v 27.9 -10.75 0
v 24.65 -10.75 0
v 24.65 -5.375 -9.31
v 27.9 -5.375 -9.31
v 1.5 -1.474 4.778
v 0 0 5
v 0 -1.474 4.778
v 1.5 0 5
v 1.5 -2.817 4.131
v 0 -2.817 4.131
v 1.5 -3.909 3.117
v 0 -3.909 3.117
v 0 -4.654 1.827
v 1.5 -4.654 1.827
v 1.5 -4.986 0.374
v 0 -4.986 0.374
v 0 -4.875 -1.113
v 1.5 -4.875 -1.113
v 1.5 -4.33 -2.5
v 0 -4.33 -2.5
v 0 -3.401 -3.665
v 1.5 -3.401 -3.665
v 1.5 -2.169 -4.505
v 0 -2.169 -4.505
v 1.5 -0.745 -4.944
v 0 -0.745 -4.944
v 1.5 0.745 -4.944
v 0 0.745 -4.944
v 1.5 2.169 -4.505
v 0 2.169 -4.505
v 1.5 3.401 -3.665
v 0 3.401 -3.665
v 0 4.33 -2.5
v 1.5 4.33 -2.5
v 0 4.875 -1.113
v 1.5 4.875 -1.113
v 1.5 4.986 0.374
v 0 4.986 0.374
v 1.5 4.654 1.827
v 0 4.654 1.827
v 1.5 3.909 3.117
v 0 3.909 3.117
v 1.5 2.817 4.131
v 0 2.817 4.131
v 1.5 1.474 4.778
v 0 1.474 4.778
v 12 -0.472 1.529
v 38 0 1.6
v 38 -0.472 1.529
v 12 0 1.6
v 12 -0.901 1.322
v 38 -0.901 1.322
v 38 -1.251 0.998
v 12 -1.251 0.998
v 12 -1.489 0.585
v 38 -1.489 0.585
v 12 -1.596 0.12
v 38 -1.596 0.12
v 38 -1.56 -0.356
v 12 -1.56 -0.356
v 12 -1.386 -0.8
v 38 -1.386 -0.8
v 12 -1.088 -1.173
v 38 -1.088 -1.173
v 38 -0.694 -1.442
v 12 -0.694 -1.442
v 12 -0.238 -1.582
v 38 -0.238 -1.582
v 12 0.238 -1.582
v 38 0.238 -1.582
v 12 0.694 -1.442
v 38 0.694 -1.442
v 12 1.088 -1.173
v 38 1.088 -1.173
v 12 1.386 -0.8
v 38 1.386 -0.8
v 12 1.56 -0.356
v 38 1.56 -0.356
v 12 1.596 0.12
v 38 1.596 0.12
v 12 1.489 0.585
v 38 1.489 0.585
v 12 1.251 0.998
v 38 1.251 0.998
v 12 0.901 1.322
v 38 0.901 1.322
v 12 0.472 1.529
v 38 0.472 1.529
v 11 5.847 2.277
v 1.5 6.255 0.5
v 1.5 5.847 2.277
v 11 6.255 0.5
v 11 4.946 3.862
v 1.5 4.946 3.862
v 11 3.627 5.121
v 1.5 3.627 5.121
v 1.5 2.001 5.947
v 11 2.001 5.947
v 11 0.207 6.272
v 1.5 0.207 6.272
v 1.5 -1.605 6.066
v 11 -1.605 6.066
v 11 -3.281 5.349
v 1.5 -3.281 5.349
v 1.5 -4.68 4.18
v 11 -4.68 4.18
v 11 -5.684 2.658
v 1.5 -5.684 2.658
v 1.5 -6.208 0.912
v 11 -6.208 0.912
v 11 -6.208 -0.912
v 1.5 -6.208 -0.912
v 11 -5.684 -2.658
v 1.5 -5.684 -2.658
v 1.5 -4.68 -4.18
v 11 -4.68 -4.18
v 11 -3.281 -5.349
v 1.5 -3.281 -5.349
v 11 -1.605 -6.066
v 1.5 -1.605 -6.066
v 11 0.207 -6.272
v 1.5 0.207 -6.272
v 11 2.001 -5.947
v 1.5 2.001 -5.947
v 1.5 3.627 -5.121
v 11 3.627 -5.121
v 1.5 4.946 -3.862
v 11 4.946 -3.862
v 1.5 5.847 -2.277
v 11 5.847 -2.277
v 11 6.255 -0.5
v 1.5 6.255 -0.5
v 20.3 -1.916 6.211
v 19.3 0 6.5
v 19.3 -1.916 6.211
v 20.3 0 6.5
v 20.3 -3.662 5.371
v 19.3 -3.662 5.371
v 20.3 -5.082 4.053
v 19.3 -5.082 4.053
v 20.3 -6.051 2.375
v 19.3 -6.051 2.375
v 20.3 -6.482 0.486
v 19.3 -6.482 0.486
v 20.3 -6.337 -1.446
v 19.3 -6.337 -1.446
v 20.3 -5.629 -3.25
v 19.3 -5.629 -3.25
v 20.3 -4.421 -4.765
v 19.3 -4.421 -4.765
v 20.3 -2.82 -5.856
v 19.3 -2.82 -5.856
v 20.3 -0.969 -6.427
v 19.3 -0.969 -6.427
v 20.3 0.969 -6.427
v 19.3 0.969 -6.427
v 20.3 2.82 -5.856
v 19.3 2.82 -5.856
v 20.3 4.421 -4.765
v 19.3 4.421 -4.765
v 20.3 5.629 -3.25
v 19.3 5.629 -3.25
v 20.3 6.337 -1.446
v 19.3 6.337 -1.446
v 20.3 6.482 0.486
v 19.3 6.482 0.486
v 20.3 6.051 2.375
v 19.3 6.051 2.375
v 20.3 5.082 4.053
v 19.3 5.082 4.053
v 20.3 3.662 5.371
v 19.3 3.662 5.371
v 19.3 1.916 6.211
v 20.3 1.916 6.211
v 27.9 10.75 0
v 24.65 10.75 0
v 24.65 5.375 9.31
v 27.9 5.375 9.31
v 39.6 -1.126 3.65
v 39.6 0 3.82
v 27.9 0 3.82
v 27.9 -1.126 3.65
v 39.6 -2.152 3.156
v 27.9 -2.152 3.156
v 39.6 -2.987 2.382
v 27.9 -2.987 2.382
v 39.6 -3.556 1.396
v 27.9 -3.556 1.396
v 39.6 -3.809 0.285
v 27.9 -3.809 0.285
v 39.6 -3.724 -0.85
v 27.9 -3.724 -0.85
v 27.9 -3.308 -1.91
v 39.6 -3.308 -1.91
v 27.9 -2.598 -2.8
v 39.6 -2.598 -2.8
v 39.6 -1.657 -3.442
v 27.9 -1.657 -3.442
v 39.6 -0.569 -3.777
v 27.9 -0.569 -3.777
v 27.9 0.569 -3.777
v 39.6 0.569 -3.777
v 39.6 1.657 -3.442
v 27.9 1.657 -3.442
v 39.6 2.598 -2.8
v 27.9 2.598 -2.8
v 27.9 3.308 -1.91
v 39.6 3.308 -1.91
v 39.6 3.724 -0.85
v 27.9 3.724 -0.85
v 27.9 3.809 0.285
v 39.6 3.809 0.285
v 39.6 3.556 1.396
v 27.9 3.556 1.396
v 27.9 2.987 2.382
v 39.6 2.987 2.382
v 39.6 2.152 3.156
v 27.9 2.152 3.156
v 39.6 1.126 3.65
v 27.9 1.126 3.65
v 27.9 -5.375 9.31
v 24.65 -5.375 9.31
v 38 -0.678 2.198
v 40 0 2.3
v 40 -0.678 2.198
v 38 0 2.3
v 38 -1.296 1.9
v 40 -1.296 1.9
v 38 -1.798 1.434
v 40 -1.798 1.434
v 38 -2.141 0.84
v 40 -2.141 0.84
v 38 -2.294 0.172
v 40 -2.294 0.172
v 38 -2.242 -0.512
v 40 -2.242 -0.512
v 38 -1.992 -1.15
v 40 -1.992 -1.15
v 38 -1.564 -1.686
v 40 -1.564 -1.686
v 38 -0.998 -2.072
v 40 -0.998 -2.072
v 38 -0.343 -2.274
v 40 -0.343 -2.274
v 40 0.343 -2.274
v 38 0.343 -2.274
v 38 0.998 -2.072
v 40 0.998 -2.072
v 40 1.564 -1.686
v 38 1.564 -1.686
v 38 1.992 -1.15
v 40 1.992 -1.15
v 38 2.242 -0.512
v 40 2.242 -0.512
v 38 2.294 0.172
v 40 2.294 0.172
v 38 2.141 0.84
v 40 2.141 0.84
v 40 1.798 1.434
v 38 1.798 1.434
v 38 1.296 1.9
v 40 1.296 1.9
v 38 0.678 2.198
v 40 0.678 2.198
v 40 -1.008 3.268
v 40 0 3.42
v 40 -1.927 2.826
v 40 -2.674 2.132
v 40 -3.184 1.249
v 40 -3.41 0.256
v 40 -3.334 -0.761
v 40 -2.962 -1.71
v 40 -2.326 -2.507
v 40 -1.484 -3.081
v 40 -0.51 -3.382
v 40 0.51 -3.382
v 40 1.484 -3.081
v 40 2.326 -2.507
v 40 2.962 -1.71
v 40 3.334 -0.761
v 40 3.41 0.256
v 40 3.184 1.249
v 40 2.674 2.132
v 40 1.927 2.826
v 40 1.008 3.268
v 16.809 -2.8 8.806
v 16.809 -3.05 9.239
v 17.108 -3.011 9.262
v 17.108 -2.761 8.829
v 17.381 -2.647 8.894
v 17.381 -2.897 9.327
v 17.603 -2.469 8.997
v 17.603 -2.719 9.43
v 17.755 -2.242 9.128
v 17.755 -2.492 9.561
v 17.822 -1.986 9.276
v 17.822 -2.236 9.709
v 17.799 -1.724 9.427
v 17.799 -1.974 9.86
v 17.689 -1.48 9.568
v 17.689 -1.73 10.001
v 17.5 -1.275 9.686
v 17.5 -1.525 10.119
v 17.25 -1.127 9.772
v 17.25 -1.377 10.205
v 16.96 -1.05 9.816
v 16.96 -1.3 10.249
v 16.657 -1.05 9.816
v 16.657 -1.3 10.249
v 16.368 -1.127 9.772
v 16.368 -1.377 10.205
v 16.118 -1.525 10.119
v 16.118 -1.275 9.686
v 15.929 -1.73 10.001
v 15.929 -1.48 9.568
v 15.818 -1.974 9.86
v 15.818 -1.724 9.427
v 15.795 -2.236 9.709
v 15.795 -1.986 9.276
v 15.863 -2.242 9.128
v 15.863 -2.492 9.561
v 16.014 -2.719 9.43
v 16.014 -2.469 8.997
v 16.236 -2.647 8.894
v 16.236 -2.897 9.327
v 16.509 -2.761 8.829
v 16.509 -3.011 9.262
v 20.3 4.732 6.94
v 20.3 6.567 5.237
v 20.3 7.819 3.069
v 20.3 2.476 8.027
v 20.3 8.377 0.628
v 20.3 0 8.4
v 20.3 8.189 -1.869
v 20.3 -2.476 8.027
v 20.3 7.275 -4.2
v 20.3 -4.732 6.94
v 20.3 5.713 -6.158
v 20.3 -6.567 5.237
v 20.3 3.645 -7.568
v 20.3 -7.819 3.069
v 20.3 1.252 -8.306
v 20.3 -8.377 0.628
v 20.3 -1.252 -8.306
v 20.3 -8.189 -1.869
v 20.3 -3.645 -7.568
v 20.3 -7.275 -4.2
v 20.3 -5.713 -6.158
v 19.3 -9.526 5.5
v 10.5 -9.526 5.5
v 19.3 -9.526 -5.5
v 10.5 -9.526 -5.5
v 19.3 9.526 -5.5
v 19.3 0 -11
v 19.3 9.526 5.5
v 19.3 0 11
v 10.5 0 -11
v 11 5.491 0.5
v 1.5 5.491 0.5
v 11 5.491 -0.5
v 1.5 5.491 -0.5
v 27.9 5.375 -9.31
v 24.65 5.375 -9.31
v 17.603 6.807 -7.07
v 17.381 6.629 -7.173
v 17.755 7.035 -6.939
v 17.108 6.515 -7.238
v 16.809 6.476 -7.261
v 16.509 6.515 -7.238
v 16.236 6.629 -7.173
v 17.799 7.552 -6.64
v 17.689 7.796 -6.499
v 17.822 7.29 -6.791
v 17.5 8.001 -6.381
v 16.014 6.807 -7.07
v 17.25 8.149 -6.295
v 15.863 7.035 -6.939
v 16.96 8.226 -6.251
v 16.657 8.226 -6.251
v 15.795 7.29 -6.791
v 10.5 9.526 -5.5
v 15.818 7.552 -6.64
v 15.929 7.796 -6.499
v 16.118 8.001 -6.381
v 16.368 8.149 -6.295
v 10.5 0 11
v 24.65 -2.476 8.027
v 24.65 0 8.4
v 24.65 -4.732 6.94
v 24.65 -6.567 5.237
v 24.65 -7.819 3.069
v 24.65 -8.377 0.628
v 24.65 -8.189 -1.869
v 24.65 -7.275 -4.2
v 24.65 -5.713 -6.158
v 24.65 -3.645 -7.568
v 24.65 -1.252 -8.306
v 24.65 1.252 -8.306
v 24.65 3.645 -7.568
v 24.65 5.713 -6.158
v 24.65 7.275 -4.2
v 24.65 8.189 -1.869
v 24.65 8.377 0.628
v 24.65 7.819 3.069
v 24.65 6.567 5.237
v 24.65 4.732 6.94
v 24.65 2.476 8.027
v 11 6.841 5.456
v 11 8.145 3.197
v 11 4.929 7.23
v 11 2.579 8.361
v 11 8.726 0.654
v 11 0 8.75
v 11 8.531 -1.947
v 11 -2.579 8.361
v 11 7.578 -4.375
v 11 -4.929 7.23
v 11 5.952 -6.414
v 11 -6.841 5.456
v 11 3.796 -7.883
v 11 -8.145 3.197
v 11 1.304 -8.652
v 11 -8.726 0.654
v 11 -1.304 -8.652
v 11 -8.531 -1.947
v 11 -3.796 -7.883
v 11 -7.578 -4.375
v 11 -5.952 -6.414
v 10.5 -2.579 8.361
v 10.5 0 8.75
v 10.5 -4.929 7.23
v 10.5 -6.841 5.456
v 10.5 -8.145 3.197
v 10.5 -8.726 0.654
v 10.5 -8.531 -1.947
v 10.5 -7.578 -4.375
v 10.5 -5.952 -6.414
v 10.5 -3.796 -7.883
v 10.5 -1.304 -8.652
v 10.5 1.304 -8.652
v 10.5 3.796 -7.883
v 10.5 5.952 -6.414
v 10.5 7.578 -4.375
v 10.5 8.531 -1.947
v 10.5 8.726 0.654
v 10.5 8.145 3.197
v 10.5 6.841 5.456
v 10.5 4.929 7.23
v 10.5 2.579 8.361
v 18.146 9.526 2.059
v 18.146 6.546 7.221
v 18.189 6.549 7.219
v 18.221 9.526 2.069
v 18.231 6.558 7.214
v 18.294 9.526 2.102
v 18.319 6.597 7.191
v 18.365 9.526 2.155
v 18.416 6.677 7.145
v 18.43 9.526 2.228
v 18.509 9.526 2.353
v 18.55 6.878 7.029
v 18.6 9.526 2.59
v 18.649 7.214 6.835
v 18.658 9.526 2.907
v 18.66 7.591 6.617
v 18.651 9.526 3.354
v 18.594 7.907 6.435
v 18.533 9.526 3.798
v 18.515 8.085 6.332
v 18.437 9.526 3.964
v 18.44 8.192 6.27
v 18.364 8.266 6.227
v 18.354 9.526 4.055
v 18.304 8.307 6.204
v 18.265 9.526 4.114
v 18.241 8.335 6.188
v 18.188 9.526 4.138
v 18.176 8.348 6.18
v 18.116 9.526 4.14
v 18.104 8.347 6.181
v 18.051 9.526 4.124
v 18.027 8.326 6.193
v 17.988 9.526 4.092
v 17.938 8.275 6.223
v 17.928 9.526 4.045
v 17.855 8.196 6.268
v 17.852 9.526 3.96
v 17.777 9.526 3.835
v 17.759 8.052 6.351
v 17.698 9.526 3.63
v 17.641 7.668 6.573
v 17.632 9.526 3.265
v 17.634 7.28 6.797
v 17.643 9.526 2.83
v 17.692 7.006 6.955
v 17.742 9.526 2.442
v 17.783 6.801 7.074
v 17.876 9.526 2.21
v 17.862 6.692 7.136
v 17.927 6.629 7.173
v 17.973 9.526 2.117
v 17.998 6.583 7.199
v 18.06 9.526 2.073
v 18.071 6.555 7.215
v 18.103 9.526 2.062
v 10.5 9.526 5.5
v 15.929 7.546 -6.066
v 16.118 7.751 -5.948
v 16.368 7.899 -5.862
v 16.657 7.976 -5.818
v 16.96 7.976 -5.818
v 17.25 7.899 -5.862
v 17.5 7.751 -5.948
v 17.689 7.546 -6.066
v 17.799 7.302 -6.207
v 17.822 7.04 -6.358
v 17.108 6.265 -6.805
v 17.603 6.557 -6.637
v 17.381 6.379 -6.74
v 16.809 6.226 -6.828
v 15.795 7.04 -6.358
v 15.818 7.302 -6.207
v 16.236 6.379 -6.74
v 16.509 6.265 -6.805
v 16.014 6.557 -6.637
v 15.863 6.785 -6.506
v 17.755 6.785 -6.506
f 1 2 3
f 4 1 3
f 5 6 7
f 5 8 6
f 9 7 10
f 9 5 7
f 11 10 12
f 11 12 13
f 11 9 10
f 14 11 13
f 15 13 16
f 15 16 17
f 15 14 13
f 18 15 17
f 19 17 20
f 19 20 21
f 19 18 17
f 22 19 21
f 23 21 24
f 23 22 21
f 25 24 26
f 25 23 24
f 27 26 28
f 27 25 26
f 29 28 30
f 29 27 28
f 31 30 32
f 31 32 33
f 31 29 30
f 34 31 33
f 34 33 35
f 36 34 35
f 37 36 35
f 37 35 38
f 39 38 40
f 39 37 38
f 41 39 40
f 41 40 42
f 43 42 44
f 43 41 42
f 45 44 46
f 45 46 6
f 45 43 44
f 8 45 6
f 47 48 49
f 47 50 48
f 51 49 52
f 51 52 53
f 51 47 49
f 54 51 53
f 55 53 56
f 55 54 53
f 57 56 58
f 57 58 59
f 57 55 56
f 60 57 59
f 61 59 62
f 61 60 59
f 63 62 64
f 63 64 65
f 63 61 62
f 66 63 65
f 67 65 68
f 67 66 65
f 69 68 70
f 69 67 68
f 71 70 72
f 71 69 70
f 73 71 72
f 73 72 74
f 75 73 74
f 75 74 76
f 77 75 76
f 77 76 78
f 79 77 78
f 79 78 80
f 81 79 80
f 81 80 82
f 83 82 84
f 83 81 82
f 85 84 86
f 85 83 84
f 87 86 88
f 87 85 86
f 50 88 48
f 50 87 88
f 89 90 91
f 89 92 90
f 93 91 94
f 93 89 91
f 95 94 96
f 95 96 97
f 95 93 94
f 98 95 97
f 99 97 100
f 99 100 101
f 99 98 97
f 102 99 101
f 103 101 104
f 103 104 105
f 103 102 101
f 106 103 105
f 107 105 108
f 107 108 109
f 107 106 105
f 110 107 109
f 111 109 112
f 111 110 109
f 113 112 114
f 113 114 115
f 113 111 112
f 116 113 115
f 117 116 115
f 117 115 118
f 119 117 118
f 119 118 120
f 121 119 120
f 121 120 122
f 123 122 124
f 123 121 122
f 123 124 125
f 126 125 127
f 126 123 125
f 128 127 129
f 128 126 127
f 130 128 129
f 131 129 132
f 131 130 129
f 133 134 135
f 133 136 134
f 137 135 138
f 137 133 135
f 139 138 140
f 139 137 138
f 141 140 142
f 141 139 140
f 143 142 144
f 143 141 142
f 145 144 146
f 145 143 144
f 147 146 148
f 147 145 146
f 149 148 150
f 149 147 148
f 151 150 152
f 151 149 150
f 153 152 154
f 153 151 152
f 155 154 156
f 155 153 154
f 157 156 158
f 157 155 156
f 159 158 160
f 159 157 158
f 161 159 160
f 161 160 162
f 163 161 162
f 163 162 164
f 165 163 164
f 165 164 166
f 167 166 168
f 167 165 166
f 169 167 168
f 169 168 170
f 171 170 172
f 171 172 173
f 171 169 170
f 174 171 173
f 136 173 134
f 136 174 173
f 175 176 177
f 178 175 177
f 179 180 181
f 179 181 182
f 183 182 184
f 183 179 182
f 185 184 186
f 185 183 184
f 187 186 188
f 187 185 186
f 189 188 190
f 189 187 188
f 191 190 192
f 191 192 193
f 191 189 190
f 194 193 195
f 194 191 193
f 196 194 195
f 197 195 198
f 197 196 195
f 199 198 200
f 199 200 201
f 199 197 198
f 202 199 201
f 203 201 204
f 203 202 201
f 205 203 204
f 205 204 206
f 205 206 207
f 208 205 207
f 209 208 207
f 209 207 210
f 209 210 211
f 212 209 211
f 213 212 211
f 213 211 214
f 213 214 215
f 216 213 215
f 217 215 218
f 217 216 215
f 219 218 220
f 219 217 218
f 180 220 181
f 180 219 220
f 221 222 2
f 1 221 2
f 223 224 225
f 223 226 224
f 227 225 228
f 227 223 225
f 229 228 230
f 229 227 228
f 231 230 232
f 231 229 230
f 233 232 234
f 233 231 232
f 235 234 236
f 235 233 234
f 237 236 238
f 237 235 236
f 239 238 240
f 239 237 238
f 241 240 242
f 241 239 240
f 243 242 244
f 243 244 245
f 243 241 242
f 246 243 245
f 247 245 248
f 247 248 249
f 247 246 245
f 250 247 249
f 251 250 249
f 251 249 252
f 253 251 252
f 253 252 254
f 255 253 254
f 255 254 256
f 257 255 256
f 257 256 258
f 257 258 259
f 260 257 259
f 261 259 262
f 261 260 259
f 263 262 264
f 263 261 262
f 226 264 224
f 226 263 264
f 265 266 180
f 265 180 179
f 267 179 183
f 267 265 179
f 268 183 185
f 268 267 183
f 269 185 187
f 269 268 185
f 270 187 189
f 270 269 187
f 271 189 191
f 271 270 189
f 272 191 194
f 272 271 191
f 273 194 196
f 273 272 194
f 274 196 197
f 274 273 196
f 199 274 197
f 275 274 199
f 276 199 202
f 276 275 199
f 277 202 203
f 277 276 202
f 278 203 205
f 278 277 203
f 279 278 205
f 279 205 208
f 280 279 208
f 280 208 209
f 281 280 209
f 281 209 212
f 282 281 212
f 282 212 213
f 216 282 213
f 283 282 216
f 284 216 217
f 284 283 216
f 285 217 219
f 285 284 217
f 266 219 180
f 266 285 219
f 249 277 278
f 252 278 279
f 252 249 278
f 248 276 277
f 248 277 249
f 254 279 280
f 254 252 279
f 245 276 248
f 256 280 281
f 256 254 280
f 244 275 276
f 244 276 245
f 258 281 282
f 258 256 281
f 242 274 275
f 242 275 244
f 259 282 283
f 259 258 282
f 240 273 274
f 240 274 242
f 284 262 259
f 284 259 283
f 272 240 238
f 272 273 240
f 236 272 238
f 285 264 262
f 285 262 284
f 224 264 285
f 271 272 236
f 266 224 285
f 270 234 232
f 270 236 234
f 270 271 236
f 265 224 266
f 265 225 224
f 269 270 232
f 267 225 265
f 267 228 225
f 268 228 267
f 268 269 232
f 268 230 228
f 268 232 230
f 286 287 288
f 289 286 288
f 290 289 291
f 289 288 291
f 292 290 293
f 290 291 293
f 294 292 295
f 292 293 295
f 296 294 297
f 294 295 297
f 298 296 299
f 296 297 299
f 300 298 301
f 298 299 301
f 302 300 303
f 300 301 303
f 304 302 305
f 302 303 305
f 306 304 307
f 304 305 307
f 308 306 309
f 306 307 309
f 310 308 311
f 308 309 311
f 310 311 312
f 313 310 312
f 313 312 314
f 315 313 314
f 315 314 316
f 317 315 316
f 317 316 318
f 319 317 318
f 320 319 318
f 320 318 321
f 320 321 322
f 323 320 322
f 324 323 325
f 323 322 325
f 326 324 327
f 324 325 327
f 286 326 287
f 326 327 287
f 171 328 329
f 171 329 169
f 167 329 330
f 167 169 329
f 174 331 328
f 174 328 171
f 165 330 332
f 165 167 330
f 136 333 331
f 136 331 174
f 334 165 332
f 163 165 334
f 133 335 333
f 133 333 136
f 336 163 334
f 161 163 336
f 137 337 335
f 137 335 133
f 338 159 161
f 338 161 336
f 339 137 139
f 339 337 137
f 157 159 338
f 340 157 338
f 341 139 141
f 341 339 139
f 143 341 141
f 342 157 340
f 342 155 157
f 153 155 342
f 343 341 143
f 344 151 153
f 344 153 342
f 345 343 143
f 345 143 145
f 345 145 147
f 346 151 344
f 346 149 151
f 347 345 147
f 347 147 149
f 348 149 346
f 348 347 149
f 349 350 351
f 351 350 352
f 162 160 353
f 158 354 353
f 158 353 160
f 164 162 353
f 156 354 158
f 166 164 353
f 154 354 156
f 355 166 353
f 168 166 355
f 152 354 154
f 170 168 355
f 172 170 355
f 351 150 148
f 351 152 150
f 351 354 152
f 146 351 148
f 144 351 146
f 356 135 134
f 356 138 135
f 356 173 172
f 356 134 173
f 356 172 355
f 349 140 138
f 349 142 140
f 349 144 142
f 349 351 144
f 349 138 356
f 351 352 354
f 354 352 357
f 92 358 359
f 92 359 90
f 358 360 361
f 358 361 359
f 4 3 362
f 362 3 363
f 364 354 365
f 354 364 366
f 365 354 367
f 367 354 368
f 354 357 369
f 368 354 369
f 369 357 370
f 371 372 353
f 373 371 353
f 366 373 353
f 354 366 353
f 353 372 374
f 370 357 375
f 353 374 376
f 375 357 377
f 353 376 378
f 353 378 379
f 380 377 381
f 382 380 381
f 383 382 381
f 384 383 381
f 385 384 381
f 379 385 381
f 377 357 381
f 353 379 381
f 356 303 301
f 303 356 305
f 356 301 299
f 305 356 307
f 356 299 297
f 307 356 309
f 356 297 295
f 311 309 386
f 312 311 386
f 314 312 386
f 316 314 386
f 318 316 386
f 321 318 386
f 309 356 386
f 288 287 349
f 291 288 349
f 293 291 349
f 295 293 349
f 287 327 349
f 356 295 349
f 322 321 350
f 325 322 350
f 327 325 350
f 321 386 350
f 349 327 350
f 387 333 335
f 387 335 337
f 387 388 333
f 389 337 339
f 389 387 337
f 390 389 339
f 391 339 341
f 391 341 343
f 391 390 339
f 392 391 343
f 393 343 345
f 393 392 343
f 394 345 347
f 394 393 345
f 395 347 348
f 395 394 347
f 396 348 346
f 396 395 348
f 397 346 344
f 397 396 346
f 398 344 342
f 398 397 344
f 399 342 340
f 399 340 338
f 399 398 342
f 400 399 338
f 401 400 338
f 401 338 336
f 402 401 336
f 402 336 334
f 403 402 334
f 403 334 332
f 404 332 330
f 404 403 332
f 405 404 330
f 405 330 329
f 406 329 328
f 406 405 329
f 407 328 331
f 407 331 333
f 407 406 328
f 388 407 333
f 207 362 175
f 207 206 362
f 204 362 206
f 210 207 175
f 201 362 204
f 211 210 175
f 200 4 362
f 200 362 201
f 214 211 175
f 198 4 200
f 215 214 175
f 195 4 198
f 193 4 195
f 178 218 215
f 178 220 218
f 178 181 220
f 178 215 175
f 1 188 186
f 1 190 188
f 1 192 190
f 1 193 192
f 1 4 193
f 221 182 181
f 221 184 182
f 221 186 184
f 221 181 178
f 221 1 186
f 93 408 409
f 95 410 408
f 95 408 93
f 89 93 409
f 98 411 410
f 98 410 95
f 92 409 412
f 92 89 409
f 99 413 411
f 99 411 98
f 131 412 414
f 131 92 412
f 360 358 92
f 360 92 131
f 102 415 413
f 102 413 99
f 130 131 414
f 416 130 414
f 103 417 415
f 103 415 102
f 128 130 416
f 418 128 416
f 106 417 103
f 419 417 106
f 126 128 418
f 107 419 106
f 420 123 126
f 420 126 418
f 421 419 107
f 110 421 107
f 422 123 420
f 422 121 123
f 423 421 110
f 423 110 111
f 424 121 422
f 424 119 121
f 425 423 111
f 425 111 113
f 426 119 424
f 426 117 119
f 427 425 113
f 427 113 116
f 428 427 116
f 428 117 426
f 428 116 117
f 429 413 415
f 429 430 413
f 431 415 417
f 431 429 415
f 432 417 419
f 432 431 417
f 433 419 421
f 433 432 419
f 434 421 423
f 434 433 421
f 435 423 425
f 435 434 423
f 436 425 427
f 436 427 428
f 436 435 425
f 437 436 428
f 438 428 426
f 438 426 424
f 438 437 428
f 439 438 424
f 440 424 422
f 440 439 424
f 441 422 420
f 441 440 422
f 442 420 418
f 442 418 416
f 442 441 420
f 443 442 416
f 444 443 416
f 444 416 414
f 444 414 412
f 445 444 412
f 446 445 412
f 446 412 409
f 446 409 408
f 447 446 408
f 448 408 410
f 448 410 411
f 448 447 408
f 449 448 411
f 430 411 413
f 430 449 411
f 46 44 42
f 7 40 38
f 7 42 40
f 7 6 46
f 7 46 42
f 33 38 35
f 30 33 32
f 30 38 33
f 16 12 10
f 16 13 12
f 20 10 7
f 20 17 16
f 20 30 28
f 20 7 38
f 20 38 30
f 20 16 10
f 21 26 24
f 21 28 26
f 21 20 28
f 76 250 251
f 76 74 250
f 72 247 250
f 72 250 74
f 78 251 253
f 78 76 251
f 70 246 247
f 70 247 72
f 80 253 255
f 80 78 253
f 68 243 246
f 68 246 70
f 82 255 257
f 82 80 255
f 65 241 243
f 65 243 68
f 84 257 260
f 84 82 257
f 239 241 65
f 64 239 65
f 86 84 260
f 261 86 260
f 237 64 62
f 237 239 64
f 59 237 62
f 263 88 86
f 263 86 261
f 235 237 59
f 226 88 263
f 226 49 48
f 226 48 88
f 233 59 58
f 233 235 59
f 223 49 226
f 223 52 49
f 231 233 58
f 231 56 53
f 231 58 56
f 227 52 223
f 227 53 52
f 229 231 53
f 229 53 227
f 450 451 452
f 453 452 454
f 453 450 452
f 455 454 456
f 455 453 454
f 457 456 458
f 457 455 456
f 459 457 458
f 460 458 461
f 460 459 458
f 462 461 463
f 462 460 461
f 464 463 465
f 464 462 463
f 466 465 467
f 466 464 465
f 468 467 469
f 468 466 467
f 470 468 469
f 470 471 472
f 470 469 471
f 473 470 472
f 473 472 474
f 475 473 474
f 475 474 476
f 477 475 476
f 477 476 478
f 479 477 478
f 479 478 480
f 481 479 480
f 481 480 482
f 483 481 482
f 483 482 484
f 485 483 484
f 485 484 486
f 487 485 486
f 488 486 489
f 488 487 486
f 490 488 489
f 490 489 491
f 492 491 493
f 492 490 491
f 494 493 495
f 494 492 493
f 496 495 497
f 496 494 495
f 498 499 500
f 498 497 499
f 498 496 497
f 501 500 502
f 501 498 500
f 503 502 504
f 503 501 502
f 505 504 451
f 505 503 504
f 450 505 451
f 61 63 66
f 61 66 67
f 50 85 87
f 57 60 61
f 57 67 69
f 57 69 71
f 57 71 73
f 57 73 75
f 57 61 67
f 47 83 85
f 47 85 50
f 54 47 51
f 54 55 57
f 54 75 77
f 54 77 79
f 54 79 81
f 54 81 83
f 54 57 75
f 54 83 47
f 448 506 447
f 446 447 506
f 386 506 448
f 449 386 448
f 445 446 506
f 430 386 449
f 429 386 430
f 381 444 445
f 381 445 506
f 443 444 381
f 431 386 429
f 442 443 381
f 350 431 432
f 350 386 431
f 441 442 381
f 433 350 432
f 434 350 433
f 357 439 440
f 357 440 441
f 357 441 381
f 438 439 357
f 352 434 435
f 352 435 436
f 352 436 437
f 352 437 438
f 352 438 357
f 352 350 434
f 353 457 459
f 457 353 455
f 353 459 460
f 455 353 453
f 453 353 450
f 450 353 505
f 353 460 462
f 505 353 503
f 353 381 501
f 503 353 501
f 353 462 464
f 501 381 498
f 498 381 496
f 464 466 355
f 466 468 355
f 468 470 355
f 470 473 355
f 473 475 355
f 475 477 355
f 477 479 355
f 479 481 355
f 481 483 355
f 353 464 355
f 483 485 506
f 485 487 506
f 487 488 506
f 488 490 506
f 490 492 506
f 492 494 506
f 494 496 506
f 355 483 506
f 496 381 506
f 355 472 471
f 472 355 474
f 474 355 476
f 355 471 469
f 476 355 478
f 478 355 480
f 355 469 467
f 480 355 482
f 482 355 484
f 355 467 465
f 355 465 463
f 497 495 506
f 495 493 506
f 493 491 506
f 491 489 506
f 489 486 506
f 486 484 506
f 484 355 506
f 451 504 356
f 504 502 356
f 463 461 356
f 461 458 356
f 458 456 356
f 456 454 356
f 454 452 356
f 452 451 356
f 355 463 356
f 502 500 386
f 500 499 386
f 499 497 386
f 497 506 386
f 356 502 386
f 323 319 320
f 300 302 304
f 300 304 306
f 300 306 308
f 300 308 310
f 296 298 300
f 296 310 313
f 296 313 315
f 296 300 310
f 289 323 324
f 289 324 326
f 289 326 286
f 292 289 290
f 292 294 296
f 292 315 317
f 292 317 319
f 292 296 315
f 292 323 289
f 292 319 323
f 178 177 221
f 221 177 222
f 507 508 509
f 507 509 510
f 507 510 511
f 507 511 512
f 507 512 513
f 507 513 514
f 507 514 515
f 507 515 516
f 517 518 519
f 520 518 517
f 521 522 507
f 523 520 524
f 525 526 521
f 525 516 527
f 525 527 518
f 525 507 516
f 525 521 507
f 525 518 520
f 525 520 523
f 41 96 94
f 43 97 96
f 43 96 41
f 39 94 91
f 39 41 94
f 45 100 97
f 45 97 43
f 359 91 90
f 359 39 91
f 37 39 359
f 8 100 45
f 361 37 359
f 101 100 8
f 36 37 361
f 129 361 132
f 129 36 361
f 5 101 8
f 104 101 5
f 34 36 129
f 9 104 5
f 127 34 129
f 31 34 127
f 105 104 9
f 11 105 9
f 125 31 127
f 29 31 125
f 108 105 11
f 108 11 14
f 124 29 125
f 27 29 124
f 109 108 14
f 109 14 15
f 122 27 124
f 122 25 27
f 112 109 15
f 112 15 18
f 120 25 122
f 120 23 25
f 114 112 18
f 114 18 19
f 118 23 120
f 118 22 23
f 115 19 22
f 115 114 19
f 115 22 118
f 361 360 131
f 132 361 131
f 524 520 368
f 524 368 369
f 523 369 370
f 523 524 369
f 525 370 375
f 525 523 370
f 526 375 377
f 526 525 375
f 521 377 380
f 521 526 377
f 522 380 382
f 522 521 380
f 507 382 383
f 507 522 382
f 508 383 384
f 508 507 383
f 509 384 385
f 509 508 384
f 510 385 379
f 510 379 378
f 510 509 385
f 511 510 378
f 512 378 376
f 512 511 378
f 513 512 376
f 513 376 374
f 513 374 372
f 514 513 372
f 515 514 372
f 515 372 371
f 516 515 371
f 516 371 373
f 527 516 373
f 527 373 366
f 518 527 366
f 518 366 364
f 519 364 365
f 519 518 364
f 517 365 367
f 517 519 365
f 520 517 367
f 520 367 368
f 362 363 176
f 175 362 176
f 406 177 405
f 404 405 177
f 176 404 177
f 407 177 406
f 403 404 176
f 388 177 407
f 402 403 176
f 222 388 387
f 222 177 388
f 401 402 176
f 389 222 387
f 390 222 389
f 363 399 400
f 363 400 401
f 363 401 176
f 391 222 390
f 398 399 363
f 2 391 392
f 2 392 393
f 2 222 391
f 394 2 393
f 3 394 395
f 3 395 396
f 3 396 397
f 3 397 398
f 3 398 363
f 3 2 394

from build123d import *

# Parameters (mm, degrees)
CHAMFER1_SIZE           = 0.4
EXTRUDE1_START          = -3.25
SKETCH2_R               = 11.925743973
EXTRUDE1_DEPTH          = 3.25
EXTRUDE2_START          = -8.8
SKETCH3_R               = 13.491172398
EXTRUDE2_DEPTH          = 8.8
SKETCH4_W               = 1
SKETCH4_H               = 1.144643989
EXTRUDE3_DEPTH          = 9.5
CUT_EXTRUDE1_DEPTH      = 48.023611133
CUT_EXTRUDE1_DEPTH_BACK = 48.023611133
SKETCH5_R               = 0.520703833
SKETCH6_R               = 1.016043674
CUT_EXTRUDE2_DEPTH      = 0.5
CUT_EXTRUDE3_START      = -0.5
SKETCH7_R               = 1.016043674
CUT_EXTRUDE3_DEPTH      = 0.5


with BuildPart() as part:
    # Sketch1 → Revolve1 (revolve)
    with BuildSketch(Plane.XY, mode=Mode.PRIVATE) as revolve1_sk:
        Polygon((0, 0), (0, 5), (1.5, 5), (1.5, 6.275), (11, 6.275), (11, 8.75), (10.5, 8.75), (10.5, 11), (19.3, 11), (19.3, 6.5), (20.3, 6.5), (20.3, 8.4), (24.65, 8.4), (24.65, 10.75), (27.9, 10.75), (27.9, 3.82), (40, 3.82), (40, 2.3), (38, 2.3), (38, 1.6), (12, 1.6), (12, 0), align=None)
    revolve(revolve1_sk.sketch.rotate(Axis((0, 0, 0), (1, 0, 0)), 90), axis=Axis((0, 0, 0), (1, 0, 0)))

    # Chamfer1
    chamfer1_edges = [part.edges().sort_by_distance(p)[0] for p in [
        (40, 0, -3.82),
    ]]
    chamfer(chamfer1_edges, length=CHAMFER1_SIZE)

    # Sketch2 → Extrude1 (cut)
    with BuildSketch(Plane(origin=(27.9, 0, 0), x_dir=(0, 0, -1), z_dir=(1, 0, 0)).offset(EXTRUDE1_START)):
        Circle(SKETCH2_R)
        Polygon((0, 10.75), (-9.309773091, 5.375), (-9.309773091, -5.375), (0, -10.75), (9.309773091, -5.375), (9.309773091, 5.375), align=None, mode=Mode.SUBTRACT)
    extrude(amount=EXTRUDE1_DEPTH, mode=Mode.SUBTRACT)

    # Sketch3 → Extrude2 (cut)
    with BuildSketch(Plane(origin=(19.3, 0, 0), x_dir=(0, 0, -1), z_dir=(1, 0, 0)).offset(EXTRUDE2_START)):
        Circle(SKETCH3_R)
        Polygon((-5.5, 9.526279442), (-11, 0), (-5.5, -9.526279442), (5.5, -9.526279442), (11, 0), (5.5, 9.526279442), align=None, mode=Mode.SUBTRACT)
    extrude(amount=EXTRUDE2_DEPTH, mode=Mode.SUBTRACT)

    # Sketch4 → Extrude3 (cut)
    with BuildSketch(Plane.ZY.offset(-1.5)):
        with Locations((0, 6.063519509)):
            Rectangle(SKETCH4_W, SKETCH4_H)
    extrude(amount=-EXTRUDE3_DEPTH, mode=Mode.SUBTRACT)

    # Sketch5 → Cut-Extrude1 (cut, two sides: drawn at the far end of the back side and taken through both)
    with BuildSketch(Plane(origin=(0, -4.763139721, 8.25), x_dir=(1, 0, 0), z_dir=(0, -0.5000000000000002, 0.8660254037844386)).offset(-CUT_EXTRUDE1_DEPTH_BACK)):
        with Locations(Location((18.145997854, 9.8, 0), (0, 0, 270))):
            Circle(SKETCH5_R)
    extrude(amount=CUT_EXTRUDE1_DEPTH + CUT_EXTRUDE1_DEPTH_BACK, mode=Mode.SUBTRACT)

    # Sketch6 → Cut-Extrude2 (cut)
    with BuildSketch(Plane(origin=(0, -4.763139721, 8.25), x_dir=(1, 0, 0), z_dir=(0, -0.5000000000000002, 0.8660254037844386))):
        with Locations(Location((16.808700708, 2.994097786, 0), (0, 0, 270))):
            Circle(SKETCH6_R)
    extrude(amount=-CUT_EXTRUDE2_DEPTH, mode=Mode.SUBTRACT)

    # Sketch7 → Cut-Extrude3 (cut)
    with BuildSketch(Plane(origin=(0, 4.763139721, -8.25), x_dir=(-1, 0, 0), z_dir=(0, 0.49999999999999944, -0.8660254037844389)).offset(CUT_EXTRUDE3_START)):
        with Locations(Location((-16.808700708, 2.994097786, 0), (0, 0, 270))):
            Circle(SKETCH7_R)
    extrude(amount=CUT_EXTRUDE3_DEPTH, mode=Mode.SUBTRACT)


solid = part.part
